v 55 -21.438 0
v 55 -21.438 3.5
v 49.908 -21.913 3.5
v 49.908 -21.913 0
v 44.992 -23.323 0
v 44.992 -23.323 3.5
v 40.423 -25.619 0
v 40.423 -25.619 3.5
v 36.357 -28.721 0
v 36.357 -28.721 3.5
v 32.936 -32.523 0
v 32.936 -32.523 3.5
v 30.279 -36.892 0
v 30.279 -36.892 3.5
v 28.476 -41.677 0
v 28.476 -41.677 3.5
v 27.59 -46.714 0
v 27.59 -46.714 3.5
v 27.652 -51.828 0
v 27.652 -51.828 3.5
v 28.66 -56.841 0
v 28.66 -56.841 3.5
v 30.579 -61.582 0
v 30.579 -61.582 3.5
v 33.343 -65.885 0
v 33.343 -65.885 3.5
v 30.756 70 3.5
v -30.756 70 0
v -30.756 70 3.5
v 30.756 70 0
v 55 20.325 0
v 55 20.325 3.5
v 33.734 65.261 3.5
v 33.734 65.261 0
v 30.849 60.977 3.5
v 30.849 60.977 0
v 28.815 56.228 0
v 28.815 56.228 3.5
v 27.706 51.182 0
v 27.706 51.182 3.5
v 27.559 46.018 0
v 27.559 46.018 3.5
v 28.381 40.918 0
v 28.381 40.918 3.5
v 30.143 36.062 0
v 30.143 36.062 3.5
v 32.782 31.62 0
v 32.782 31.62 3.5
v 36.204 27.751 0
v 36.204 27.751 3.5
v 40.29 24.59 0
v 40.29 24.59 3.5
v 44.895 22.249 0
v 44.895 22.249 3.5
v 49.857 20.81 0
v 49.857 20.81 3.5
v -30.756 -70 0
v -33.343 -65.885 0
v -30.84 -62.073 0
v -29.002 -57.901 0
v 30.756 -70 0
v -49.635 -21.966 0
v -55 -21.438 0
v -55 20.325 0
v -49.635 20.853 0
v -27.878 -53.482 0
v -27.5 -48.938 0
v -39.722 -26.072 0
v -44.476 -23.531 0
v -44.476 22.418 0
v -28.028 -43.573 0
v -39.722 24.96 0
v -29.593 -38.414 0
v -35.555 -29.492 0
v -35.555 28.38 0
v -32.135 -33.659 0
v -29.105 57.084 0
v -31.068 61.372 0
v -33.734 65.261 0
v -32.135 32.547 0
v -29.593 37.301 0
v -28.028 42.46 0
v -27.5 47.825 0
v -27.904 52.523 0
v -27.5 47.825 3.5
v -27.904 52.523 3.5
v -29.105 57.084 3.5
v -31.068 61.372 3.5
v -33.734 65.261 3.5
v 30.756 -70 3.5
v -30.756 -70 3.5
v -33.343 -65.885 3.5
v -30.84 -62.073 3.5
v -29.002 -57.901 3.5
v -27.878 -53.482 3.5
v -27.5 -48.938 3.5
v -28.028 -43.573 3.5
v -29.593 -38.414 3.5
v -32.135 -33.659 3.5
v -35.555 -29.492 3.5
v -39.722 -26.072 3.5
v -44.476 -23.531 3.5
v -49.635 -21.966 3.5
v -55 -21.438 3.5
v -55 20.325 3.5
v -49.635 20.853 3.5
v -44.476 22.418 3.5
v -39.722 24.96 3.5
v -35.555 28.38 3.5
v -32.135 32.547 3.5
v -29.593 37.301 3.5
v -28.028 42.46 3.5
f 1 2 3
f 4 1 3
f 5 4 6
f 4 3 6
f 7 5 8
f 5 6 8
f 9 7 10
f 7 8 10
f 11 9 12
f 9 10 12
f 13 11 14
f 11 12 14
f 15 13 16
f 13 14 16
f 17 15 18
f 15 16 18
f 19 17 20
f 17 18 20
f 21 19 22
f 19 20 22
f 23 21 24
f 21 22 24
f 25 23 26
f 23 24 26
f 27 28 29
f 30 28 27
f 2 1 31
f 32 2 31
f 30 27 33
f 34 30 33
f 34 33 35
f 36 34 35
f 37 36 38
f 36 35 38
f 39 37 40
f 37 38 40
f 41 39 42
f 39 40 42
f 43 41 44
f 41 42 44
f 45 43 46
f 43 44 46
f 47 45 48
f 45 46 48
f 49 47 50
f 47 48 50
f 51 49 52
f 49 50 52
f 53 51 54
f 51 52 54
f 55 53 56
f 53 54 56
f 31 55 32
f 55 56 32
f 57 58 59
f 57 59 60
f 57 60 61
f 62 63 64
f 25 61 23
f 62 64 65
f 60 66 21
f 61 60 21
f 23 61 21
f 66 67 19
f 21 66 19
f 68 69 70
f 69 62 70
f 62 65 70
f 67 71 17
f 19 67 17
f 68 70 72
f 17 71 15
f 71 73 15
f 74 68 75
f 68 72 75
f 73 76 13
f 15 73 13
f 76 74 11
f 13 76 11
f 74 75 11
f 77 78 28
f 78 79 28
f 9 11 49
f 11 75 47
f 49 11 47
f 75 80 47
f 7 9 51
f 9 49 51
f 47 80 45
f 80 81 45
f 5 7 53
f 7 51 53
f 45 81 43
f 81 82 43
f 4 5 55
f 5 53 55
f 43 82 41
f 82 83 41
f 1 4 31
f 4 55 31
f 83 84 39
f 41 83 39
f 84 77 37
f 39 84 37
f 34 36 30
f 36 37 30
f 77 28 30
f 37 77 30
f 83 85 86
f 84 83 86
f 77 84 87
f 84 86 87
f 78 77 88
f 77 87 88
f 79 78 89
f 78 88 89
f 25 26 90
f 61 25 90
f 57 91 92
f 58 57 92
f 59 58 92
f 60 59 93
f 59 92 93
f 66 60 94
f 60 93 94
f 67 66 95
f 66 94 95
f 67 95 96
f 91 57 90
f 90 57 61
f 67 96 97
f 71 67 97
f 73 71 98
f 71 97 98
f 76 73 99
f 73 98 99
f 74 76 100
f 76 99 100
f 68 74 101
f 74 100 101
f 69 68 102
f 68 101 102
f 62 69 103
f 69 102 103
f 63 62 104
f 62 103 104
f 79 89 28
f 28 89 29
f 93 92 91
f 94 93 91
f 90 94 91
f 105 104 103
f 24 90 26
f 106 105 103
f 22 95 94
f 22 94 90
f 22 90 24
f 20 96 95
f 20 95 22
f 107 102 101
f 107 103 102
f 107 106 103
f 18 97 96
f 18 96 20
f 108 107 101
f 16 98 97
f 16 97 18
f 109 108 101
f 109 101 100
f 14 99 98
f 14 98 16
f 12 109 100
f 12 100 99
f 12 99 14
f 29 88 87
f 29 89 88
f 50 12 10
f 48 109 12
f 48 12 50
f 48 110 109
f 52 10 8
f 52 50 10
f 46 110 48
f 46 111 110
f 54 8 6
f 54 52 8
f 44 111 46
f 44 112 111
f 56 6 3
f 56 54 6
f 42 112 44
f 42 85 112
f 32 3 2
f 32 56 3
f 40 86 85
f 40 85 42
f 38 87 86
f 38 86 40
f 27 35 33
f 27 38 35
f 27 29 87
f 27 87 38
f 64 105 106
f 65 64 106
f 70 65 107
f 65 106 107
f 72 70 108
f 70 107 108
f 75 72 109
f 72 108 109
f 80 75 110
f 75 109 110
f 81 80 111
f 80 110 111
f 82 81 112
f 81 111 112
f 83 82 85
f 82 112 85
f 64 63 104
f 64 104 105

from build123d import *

# Parameters (mm, degrees)
F0_W     = 110
F0_H     = 140
F1_DEPTH = 3.5
F3_DEPTH = 25
F5_DEPTH = 25


with BuildPart() as f1:
    # F0 (on Top) → F1 (new body)
    with BuildSketch(Plane.XY):
        Rectangle(F0_W, F0_H)
    extrude(amount=F1_DEPTH)

    # F2 (on face) → F3 (cut)
    with BuildSketch(Plane.XY.offset(3.5)):
        with BuildLine():
            ThreePointArc((-55, 20.325035), (-35.554564, 28.379598), (-27.5, 47.825035))
            ThreePointArc((-27.5, 47.825035), (-30.469277, 60.254582), (-38.735901, 70))
            Line((-38.735901, 70), (-55, 70))
            Line((-55, 70), (-55, 20.325035))
        make_face()
        with BuildLine():
            Line((-55, 70), (-38.735901, 70))
            ThreePointArc((-38.735901, 70), (-81.134857, 56.381858), (-55, 20.325035))
            Line((-55, 20.325035), (-55, 70))
        make_face()
        with BuildLine():
            ThreePointArc((-27.5, -48.937567), (-35.554564, -29.49213), (-55, -21.437567))
            Line((-55, -21.437567), (-55, -70))
            Line((-55, -70), (-37.318826, -70))
            ThreePointArc((-37.318826, -70), (-30.075291, -60.556898), (-27.5, -48.937567))
        make_face()
        with BuildLine():
            Line((-55, -70), (-55, -21.437567))
            ThreePointArc((-55, -21.437567), (-80.840539, -58.34589), (-37.318826, -70))
            Line((-37.318826, -70), (-55, -70))
        make_face()
        with BuildLine():
            ThreePointArc((82.5, 47.825035), (67.429547, 72.355757), (38.735901, 70))
            Line((38.735901, 70), (55, 70))
            Line((55, 70), (55, 20.325035))
            ThreePointArc((55, 20.325035), (74.445436, 28.379598), (82.5, 47.825035))
        make_face()
        with BuildLine():
            Line((55, 70), (38.735901, 70))
            ThreePointArc((38.735901, 70), (28.865143, 39.268211), (55, 20.325035))
            Line((55, 20.325035), (55, 70))
        make_face()
        with BuildLine():
            Line((55, -70), (55, -21.437567))
            ThreePointArc((55, -21.437567), (29.159461, -39.529244), (37.318826, -70))
            Line((37.318826, -70), (55, -70))
        make_face()
        with BuildLine():
            ThreePointArc((82.5, -48.937567), (74.445436, -29.49213), (55, -21.437567))
            Line((55, -21.437567), (55, -70))
            Line((55, -70), (37.318826, -70))
            ThreePointArc((37.318826, -70), (66.619331, -73.862276), (82.5, -48.937567))
        make_face()
    extrude(amount=-F3_DEPTH, mode=Mode.SUBTRACT)

    # F4 (on face) → F5 (cut)
    with BuildSketch(Plane.XY.offset(3.5)):
        Polygon((-60.47887, 76.34218), (-39.233364, 56.513041), (-26.769334, 76.34218), align=None)
        Polygon((26.769334, 76.34218), (39.233364, 56.513041), (60.47887, 76.34218), align=None)
        Polygon((-39.233364, -56.513041), (-60.47887, -76.34218), (-26.769334, -76.34218), align=None)
        Polygon((60.47887, -76.34218), (39.233364, -56.513041), (26.769334, -76.34218), align=None)
    extrude(amount=-F5_DEPTH, mode=Mode.SUBTRACT)


solid = f1.part
